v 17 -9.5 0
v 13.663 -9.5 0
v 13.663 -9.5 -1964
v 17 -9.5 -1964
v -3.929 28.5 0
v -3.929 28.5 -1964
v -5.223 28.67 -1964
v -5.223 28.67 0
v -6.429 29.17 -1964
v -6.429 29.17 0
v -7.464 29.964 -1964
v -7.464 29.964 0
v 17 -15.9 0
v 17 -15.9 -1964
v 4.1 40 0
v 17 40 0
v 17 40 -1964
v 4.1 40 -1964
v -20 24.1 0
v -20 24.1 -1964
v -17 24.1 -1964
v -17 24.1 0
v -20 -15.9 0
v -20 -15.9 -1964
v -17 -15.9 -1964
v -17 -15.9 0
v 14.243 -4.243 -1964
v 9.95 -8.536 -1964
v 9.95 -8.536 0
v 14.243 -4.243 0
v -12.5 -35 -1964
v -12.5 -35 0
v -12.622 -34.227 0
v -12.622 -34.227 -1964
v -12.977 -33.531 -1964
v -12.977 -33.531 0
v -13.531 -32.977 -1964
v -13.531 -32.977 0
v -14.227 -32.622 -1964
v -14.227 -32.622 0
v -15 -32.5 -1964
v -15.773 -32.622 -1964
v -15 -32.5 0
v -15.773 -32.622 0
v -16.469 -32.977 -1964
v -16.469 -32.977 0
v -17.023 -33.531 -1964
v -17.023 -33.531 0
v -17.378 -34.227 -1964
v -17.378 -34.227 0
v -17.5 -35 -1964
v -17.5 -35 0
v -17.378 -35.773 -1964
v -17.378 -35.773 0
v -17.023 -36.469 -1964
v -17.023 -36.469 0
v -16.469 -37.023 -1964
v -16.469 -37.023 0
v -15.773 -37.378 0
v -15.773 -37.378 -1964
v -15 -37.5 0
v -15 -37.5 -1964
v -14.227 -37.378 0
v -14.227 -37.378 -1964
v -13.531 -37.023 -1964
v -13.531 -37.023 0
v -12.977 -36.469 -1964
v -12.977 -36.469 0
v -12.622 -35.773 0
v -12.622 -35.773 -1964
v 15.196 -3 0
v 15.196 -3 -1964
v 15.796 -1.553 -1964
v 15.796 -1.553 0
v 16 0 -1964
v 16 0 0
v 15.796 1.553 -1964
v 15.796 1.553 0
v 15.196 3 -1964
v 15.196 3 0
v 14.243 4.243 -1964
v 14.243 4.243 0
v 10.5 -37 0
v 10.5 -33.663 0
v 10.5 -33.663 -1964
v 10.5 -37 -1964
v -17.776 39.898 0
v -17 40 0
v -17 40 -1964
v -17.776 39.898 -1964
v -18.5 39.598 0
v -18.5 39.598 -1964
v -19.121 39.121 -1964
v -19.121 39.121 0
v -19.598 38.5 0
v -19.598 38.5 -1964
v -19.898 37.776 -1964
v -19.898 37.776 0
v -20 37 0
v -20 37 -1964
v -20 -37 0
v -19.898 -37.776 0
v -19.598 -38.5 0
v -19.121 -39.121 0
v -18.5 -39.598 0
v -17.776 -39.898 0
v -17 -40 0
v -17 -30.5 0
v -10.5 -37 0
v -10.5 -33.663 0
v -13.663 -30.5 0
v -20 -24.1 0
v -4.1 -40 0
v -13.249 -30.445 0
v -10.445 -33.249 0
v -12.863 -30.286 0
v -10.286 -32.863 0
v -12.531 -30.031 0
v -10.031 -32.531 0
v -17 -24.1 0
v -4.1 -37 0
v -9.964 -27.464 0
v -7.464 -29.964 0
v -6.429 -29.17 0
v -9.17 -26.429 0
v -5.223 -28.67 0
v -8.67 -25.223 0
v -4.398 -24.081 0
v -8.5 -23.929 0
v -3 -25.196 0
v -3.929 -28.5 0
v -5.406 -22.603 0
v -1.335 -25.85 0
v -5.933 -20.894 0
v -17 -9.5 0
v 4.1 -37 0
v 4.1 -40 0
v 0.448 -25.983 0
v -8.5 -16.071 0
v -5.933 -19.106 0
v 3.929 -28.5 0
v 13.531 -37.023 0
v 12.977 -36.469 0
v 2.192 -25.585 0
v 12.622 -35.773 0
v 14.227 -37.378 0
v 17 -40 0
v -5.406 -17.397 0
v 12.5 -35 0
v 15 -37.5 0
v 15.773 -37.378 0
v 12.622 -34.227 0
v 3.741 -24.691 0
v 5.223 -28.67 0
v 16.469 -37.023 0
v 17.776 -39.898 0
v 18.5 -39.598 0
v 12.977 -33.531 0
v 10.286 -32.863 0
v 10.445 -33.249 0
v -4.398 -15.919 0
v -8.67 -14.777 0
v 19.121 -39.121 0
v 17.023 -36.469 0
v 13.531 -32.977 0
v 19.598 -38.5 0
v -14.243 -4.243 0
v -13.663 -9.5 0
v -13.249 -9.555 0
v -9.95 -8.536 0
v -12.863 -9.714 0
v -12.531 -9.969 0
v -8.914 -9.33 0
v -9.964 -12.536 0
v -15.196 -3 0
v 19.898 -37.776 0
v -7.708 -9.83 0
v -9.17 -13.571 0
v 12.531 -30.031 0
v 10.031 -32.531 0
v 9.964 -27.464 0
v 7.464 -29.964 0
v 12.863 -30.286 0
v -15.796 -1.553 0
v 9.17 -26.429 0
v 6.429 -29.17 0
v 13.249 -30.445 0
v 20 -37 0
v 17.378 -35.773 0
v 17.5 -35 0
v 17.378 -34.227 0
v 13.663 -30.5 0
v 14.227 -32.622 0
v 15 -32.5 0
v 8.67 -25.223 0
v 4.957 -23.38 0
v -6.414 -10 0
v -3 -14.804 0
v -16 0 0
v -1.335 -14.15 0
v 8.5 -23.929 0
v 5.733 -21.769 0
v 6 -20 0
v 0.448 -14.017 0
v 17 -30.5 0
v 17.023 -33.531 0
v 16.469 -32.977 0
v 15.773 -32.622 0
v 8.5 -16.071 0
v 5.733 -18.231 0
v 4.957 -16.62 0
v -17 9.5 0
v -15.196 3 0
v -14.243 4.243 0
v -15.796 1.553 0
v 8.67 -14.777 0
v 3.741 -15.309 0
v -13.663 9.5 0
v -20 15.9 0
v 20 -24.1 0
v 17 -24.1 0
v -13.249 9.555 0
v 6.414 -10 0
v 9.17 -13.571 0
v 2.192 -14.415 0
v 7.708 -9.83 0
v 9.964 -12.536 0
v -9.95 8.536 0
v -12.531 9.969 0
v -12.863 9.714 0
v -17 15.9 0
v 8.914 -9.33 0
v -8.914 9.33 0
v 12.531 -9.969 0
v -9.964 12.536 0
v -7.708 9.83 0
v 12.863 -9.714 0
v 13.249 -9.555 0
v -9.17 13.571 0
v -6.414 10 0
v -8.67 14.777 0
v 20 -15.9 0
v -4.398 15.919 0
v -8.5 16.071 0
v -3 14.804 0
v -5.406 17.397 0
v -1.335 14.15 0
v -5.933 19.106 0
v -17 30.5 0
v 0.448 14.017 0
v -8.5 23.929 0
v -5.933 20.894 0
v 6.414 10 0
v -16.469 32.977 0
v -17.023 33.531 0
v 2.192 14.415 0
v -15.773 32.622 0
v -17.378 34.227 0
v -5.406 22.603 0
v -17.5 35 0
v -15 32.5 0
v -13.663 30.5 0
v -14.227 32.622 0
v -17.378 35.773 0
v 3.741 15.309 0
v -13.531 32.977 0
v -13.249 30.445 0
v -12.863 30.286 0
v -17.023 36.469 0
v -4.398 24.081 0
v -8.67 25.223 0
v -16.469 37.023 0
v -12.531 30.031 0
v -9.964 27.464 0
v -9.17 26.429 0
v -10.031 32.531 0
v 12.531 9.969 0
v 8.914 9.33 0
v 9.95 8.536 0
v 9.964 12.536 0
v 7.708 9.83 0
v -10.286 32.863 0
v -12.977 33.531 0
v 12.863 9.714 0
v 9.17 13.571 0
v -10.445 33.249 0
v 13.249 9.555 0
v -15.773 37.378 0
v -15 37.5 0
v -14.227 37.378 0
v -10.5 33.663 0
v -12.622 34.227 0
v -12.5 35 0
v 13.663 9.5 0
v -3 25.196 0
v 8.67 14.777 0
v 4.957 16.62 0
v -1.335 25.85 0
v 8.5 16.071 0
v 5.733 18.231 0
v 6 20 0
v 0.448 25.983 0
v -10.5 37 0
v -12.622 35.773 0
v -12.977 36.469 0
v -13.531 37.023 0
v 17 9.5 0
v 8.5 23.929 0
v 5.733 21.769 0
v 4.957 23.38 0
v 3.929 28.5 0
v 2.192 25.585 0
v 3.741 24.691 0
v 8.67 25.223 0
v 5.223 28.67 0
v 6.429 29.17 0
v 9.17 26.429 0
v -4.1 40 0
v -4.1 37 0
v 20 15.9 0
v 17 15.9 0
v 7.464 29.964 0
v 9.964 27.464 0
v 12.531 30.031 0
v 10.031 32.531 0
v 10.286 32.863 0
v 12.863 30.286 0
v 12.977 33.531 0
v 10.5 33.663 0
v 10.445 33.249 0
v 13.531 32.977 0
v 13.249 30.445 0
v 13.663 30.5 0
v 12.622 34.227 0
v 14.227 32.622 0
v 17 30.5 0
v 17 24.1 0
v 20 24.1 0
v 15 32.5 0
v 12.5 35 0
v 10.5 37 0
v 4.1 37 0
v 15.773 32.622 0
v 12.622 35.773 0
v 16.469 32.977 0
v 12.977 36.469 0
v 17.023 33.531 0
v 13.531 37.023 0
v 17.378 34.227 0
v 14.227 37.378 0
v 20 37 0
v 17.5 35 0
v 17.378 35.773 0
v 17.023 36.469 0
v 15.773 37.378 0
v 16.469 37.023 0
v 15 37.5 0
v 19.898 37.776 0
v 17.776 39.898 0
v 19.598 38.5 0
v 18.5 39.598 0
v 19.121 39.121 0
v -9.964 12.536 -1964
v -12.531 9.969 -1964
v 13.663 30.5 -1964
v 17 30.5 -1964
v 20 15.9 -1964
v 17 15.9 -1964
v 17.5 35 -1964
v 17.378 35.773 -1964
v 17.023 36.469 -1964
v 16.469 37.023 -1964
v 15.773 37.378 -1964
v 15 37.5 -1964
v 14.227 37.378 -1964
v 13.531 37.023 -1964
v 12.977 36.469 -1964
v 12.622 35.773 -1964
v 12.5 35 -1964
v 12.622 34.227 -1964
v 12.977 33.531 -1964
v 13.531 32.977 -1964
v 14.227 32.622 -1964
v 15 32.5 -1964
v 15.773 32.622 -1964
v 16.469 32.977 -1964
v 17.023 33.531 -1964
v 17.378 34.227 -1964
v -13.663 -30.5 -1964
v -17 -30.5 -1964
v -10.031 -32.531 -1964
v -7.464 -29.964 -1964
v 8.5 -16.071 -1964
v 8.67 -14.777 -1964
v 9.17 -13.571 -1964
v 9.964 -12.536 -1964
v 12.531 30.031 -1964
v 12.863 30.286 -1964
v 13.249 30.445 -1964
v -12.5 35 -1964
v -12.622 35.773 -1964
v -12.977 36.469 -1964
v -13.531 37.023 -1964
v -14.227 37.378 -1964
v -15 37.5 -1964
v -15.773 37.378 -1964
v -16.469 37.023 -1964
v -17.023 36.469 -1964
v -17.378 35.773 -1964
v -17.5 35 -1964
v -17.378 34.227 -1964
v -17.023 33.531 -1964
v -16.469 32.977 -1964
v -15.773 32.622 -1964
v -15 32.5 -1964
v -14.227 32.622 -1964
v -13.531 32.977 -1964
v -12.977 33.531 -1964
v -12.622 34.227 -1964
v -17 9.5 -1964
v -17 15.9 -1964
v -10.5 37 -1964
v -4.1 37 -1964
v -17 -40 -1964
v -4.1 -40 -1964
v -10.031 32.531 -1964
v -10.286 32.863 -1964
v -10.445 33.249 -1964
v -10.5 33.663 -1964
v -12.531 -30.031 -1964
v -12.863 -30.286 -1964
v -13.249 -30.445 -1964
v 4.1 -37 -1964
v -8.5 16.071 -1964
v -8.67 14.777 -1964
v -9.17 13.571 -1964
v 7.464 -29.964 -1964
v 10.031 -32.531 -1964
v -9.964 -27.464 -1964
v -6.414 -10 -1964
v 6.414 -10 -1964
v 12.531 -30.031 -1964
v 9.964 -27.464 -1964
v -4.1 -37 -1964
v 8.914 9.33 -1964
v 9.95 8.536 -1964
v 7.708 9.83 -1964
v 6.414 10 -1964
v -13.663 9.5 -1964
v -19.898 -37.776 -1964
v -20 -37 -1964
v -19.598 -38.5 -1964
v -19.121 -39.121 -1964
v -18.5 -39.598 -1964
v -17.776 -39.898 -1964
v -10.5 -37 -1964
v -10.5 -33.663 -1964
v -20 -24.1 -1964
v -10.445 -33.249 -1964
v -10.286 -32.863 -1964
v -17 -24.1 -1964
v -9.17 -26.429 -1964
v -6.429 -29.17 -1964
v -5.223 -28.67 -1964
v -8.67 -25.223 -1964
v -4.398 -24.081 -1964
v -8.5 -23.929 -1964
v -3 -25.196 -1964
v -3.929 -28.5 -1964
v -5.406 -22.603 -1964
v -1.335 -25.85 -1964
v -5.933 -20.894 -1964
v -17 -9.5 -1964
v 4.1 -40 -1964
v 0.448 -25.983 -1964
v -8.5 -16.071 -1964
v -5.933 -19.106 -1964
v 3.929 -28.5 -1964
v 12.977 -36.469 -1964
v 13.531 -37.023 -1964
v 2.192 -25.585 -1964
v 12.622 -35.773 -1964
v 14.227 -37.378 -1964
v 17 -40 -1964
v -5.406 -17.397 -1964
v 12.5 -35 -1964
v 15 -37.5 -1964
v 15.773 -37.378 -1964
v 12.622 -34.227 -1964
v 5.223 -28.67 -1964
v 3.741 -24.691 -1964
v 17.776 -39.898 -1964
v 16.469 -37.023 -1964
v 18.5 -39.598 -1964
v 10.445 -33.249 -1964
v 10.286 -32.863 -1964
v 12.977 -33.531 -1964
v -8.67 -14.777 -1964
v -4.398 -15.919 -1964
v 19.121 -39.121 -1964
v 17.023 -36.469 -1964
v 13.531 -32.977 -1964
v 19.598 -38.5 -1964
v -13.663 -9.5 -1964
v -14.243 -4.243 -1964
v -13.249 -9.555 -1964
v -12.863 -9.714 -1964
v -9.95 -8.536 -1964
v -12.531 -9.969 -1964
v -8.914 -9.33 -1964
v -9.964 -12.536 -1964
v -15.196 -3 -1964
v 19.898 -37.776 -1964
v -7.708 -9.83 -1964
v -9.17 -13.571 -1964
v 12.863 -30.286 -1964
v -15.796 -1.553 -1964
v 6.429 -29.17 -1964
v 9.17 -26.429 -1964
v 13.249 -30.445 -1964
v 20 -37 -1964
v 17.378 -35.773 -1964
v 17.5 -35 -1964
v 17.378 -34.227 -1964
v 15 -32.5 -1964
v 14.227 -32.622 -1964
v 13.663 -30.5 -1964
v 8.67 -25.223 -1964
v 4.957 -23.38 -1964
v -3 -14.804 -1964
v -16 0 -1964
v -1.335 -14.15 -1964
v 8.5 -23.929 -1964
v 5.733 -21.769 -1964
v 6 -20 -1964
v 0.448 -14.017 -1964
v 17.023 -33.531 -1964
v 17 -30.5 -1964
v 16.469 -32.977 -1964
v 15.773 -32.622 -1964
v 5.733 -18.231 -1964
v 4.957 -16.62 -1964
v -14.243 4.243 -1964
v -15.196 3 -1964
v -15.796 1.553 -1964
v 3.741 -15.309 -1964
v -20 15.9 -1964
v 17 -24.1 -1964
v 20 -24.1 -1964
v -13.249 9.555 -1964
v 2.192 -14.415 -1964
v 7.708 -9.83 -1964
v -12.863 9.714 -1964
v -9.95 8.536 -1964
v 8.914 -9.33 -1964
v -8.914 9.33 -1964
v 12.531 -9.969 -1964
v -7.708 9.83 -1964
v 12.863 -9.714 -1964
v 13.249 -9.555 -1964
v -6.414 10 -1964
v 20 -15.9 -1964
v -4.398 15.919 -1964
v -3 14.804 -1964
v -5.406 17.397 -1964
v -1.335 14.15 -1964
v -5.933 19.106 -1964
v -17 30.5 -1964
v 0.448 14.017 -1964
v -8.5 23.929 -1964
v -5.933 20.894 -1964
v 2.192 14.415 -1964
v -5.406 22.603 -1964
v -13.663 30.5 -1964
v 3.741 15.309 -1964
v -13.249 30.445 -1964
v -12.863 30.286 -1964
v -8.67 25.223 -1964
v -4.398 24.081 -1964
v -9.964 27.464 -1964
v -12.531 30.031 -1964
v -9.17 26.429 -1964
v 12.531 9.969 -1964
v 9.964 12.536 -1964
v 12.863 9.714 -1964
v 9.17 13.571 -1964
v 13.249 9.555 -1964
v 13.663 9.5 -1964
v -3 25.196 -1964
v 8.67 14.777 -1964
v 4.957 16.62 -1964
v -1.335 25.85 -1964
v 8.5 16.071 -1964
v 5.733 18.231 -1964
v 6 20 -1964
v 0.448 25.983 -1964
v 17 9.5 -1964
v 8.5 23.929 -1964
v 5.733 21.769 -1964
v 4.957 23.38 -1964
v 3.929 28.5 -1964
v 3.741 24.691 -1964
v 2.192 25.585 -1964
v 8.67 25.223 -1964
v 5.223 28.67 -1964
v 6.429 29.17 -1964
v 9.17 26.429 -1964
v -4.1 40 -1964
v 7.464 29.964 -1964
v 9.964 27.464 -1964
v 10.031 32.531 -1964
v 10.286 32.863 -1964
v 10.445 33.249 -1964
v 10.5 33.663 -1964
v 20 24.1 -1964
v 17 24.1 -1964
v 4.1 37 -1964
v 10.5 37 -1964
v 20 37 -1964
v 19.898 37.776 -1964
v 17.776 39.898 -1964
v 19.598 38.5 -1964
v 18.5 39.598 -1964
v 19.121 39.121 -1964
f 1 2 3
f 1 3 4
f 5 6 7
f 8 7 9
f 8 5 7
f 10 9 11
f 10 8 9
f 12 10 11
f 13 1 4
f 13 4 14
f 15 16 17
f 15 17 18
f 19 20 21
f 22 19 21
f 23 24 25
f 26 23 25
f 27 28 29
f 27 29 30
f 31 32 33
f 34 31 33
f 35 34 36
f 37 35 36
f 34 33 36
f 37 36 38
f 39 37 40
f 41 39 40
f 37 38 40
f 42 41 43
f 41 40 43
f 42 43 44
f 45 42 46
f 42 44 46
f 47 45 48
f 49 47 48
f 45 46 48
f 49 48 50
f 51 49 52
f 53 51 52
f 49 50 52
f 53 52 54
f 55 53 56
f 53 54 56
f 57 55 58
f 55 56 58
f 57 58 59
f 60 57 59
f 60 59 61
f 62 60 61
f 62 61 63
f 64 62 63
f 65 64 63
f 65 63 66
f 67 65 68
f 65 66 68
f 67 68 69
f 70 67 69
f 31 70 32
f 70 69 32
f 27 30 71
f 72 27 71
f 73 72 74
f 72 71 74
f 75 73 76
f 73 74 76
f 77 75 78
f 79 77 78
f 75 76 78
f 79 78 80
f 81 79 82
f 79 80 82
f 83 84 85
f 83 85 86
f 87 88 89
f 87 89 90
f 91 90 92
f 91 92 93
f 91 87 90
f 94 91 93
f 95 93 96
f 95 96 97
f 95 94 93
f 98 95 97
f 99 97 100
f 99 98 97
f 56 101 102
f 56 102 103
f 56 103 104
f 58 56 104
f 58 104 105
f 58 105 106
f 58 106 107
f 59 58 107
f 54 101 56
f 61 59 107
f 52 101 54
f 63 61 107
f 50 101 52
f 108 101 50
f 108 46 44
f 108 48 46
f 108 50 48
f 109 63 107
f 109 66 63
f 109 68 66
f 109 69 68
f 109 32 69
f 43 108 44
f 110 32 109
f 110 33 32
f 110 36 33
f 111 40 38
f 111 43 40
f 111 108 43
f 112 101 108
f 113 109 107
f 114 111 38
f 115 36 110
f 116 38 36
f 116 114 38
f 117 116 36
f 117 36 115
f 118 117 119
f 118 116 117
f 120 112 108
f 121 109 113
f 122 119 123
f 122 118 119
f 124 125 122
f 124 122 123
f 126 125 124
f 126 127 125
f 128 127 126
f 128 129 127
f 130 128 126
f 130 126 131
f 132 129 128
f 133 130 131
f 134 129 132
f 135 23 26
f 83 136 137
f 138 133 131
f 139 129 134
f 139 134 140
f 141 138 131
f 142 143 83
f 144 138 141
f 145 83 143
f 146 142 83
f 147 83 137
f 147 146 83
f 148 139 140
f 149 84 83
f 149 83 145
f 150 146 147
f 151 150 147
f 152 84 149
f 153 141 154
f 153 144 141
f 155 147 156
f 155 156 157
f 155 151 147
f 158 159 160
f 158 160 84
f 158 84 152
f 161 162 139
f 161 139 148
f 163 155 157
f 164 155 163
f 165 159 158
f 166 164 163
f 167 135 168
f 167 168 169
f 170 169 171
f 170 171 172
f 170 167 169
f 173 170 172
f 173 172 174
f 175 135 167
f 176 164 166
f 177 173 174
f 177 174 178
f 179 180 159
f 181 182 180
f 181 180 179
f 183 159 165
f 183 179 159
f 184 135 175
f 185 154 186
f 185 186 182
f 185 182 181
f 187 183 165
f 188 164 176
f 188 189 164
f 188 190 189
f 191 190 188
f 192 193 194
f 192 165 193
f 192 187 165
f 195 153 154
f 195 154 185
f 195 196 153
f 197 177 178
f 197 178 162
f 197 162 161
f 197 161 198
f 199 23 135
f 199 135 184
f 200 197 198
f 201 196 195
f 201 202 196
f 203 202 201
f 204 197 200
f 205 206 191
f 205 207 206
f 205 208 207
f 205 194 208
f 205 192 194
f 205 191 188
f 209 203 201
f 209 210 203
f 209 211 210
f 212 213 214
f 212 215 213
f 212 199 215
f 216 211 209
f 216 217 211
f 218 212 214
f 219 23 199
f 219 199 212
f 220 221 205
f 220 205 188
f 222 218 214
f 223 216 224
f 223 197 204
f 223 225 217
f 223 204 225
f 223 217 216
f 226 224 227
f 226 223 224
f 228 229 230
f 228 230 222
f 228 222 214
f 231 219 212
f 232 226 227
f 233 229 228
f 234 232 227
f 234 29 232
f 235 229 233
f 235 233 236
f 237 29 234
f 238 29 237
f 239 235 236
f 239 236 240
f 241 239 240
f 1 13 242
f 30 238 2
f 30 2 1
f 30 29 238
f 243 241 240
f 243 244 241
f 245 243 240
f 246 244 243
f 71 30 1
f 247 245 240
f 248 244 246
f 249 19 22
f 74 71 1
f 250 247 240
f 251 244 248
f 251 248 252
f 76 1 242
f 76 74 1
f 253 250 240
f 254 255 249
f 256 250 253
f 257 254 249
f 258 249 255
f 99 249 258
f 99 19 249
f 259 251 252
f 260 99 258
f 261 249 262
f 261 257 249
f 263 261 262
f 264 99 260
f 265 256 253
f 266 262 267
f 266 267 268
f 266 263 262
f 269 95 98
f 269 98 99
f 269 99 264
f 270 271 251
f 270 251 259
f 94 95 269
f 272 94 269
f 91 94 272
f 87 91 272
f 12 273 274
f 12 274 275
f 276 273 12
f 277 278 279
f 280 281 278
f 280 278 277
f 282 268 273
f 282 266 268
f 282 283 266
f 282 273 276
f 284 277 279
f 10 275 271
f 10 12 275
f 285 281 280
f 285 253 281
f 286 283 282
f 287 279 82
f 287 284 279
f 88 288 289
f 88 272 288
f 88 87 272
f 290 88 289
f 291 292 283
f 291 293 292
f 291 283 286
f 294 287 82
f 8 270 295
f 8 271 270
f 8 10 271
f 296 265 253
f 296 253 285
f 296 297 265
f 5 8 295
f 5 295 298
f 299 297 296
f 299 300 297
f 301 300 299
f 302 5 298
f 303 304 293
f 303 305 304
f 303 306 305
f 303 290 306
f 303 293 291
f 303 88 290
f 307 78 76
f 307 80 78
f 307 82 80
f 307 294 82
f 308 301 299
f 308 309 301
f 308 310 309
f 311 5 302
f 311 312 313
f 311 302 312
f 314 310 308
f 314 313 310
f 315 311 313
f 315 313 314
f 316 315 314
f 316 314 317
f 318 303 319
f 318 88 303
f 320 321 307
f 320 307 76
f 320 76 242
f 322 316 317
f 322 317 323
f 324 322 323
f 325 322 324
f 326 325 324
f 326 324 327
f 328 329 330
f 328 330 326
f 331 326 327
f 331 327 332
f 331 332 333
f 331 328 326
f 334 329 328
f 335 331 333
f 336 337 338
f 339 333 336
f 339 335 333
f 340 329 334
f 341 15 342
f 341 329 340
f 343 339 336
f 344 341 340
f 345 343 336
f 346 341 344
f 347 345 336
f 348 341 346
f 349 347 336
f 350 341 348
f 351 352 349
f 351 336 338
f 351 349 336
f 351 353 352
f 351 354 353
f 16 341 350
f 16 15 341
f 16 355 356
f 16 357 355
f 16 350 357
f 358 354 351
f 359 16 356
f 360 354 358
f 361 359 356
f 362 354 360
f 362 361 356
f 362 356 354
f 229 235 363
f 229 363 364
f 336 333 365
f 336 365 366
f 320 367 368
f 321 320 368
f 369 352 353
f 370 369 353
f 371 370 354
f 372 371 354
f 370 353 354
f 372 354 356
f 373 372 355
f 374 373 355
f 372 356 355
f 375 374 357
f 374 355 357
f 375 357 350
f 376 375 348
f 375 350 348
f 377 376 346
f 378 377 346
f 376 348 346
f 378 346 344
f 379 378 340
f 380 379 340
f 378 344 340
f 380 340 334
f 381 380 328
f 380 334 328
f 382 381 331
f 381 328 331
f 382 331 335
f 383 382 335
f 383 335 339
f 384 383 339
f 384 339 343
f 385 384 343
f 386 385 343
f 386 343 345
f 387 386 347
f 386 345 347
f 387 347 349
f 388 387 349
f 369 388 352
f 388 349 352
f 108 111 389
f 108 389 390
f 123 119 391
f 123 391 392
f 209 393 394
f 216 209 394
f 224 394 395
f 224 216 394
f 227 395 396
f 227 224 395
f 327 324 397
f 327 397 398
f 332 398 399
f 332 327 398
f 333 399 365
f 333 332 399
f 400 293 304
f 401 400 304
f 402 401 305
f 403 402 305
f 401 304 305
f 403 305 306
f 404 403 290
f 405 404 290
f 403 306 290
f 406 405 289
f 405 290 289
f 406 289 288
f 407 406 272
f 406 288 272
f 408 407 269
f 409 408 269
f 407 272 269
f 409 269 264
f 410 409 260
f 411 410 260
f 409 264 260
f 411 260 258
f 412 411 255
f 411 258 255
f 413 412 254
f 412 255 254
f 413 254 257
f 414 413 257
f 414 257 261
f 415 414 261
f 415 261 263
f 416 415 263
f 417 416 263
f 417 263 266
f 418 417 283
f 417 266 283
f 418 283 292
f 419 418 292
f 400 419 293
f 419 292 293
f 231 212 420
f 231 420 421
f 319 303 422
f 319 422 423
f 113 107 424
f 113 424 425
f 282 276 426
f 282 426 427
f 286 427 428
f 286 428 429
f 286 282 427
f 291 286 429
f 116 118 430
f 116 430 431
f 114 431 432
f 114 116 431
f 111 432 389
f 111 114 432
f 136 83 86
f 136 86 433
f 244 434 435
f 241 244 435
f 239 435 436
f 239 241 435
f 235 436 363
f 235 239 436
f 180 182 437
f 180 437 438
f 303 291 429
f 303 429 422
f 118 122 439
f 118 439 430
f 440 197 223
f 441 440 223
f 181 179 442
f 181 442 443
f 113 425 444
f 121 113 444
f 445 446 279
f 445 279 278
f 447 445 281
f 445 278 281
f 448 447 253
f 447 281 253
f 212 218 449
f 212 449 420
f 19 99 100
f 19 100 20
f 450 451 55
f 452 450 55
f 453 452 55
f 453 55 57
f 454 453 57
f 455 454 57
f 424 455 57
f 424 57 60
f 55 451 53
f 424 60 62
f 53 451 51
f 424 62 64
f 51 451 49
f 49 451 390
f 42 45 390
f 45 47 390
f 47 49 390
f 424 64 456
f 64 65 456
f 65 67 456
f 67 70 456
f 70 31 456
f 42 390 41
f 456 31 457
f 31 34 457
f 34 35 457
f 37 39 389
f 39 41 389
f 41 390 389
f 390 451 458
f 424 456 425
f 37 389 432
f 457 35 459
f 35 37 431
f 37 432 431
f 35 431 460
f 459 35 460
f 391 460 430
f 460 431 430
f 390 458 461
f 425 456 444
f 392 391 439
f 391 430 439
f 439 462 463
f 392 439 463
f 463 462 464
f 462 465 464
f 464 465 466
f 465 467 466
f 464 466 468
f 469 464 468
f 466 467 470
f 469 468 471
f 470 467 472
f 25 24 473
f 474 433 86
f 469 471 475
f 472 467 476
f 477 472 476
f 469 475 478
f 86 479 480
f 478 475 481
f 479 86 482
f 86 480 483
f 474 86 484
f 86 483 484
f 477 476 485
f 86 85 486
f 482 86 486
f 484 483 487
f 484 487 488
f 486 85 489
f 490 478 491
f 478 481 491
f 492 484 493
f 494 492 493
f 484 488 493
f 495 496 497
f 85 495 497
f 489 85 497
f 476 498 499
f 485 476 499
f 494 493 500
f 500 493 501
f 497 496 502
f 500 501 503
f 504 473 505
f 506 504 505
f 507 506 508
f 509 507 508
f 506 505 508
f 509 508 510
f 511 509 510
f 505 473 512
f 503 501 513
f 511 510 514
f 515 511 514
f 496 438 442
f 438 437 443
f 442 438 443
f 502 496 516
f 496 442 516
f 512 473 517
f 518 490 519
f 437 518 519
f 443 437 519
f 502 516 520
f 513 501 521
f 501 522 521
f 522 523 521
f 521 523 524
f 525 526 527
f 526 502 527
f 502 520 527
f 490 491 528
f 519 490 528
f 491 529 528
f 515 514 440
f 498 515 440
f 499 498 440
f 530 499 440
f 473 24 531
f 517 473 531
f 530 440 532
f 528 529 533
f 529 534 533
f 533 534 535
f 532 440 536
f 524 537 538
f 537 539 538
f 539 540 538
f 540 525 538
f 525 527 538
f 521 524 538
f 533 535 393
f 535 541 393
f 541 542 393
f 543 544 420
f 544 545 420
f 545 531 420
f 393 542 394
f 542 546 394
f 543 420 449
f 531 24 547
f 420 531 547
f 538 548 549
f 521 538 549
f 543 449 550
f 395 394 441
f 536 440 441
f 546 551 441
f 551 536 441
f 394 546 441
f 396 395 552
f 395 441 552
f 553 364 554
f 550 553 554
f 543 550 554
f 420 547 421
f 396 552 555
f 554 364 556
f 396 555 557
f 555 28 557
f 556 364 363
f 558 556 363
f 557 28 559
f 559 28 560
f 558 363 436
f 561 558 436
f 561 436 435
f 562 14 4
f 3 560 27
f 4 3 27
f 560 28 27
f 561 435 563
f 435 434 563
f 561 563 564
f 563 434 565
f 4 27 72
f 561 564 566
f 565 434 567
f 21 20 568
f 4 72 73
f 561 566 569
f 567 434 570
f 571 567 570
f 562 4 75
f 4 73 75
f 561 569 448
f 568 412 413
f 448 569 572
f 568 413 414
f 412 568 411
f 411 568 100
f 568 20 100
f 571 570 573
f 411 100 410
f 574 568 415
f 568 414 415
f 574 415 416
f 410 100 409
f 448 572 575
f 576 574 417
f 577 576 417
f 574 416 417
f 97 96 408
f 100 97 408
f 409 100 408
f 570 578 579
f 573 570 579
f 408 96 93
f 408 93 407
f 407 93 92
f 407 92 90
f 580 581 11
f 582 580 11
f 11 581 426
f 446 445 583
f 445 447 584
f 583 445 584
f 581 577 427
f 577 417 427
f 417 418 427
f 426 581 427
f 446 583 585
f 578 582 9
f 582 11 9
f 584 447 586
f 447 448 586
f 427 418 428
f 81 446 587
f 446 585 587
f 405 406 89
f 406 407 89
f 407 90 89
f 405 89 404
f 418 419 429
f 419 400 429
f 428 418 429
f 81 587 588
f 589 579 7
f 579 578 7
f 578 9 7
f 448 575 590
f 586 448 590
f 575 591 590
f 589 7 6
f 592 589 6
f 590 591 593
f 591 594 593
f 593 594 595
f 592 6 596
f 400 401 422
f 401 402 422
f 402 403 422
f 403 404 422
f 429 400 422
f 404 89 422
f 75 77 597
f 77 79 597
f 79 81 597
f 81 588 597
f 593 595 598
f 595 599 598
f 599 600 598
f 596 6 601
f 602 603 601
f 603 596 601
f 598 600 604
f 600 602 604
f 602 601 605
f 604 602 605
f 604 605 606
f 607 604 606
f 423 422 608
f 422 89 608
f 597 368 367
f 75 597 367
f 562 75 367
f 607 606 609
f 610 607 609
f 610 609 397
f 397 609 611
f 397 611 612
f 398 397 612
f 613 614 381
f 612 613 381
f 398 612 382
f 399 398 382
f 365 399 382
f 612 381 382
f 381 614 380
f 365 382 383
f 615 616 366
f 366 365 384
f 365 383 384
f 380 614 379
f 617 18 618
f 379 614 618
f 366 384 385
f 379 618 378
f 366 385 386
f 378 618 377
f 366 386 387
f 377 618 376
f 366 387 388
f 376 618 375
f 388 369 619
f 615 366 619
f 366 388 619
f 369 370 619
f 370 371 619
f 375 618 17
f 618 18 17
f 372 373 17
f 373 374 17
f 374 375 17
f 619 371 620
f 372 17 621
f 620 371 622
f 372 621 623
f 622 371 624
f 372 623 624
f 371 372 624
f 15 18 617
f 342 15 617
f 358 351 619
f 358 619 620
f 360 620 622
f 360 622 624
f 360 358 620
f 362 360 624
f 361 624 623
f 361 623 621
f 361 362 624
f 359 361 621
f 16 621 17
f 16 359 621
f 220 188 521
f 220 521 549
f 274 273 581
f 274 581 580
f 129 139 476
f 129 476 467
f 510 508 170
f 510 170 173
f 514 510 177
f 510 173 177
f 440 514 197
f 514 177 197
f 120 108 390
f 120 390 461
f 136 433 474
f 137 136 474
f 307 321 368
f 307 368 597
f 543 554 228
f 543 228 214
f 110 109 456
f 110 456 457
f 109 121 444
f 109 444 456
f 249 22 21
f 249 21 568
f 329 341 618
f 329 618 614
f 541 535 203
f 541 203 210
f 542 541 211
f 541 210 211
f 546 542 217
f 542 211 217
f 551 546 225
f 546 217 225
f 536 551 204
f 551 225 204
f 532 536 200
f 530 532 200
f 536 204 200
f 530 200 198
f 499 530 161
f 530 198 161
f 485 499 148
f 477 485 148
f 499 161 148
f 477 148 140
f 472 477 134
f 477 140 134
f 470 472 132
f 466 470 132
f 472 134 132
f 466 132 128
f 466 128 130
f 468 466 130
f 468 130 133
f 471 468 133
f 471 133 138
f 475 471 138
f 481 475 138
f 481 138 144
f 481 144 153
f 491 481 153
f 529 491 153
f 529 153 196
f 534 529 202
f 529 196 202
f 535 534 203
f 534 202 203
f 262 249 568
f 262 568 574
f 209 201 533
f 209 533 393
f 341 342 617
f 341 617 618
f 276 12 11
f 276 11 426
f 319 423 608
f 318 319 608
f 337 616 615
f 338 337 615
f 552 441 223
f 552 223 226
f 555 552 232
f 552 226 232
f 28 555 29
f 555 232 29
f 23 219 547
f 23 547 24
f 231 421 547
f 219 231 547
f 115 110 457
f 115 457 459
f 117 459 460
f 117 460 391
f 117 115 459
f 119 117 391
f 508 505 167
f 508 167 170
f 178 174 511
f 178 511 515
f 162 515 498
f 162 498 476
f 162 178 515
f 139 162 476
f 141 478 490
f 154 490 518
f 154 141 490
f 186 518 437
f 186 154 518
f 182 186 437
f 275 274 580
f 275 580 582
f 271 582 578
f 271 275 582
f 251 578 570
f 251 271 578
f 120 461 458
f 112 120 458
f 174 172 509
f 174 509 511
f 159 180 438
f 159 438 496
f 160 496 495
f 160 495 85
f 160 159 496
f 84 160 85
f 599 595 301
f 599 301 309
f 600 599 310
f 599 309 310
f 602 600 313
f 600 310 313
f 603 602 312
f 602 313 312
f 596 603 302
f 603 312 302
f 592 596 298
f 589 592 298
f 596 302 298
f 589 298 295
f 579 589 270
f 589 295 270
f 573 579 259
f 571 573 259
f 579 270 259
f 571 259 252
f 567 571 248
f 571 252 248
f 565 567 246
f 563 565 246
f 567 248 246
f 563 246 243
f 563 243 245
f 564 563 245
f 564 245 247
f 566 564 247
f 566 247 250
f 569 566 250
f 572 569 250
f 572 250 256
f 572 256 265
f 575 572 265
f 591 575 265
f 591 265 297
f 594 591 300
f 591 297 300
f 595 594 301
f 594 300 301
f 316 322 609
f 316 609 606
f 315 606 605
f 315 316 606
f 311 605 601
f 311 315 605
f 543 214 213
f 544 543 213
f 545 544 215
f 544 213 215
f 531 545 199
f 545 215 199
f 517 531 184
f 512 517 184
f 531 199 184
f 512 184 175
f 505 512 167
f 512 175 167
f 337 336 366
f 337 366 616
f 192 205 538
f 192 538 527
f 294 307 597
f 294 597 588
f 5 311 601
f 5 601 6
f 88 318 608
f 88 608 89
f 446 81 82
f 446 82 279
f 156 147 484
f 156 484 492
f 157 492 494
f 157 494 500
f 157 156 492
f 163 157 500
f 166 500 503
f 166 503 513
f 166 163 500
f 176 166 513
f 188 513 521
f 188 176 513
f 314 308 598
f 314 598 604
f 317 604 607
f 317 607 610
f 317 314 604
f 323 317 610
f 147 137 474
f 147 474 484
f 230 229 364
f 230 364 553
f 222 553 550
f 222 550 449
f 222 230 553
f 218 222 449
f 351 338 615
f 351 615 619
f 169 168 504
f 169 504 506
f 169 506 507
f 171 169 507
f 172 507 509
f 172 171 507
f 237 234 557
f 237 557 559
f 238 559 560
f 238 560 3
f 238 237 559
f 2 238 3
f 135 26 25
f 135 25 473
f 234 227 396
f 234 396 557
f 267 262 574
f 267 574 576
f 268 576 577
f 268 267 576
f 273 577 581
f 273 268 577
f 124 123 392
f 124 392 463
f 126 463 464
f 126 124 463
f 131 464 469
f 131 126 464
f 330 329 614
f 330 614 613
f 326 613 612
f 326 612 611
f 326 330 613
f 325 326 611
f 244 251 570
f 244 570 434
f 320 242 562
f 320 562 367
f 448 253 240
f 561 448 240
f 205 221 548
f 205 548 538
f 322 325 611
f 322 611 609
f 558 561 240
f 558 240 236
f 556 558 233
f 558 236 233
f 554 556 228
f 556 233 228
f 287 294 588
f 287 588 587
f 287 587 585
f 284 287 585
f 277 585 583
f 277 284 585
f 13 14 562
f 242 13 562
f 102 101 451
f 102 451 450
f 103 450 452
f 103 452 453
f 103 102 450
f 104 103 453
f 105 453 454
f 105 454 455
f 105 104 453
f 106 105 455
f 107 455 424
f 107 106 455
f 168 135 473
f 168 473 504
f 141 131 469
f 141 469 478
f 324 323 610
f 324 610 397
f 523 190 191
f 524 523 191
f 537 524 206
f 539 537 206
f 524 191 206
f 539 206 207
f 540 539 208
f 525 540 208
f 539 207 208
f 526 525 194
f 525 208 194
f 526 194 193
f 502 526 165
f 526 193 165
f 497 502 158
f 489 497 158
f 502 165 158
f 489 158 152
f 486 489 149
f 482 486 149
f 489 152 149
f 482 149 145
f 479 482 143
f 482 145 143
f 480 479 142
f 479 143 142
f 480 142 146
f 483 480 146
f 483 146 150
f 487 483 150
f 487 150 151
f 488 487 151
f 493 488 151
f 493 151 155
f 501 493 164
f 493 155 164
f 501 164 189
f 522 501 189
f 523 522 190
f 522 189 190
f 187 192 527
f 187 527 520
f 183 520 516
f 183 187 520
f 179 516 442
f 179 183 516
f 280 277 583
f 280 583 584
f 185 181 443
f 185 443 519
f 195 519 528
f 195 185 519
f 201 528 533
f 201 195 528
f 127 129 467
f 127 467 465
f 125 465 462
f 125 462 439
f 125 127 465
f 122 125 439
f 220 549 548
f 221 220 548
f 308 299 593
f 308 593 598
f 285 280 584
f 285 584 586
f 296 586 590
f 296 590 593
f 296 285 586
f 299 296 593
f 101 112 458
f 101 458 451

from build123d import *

# Parameters (mm, degrees)
SKETCH1_R           = 2.5
SKETCH1_R_2         = 6
BOSS_EXTRUDE1_DEPTH = 1964


with BuildPart() as part:
    # Sketch1 → Boss-Extrude1 (new body)
    with BuildSketch(Plane.XY):
        with BuildLine():
            Line((-17, -40), (-4.1, -40))
            Line((-4.1, -40), (-4.1, -37))
            Line((-4.1, -37), (-10.5, -37))
            Line((-10.5, -37), (-10.5, -33.6627417))
            ThreePointArc((-10.5, -33.6627417), (-10.378207252, -33.050448208), (-10.03137085, -32.53137085))
            Line((-10.03137085, -32.53137085), (-7.464466094, -29.964466094))
            ThreePointArc((-7.464466094, -29.964466094), (-5.84234935, -28.880602337), (-3.928932188, -28.5))
            Line((-3.928932188, -28.5), (3.928932188, -28.5))
            ThreePointArc((3.928932188, -28.5), (5.84234935, -28.880602337), (7.464466094, -29.964466094))
            Line((7.464466094, -29.964466094), (10.03137085, -32.53137085))
            ThreePointArc((10.03137085, -32.53137085), (10.378207252, -33.050448208), (10.5, -33.6627417))
            Line((10.5, -33.6627417), (10.5, -37))
            Line((10.5, -37), (4.1, -37))
            Line((4.1, -37), (4.1, -40))
            Line((4.1, -40), (17, -40))
            ThreePointArc((17, -40), (19.121320344, -39.121320344), (20, -37))
            Line((20, -37), (20, -24.1))
            Line((20, -24.1), (17, -24.1))
            Line((17, -24.1), (17, -30.5))
            Line((17, -30.5), (13.6627417, -30.5))
            ThreePointArc((13.6627417, -30.5), (13.050448208, -30.378207252), (12.53137085, -30.03137085))
            Line((12.53137085, -30.03137085), (9.964466094, -27.464466094))
            ThreePointArc((9.964466094, -27.464466094), (8.880602337, -25.84234935), (8.5, -23.928932188))
            Line((8.5, -23.928932188), (8.5, -16.071067812))
            ThreePointArc((8.5, -16.071067812), (8.880602337, -14.15765065), (9.964466094, -12.535533906))
            Line((9.964466094, -12.535533906), (12.53137085, -9.96862915))
            ThreePointArc((12.53137085, -9.96862915), (13.050448208, -9.621792748), (13.6627417, -9.5))
            Line((13.6627417, -9.5), (17, -9.5))
            Line((17, -9.5), (17, -15.9))
            Line((17, -15.9), (20, -15.9))
            Line((20, -15.9), (20, 15.9))
            Line((20, 15.9), (17, 15.9))
            Line((17, 15.9), (17, 9.5))
            Line((17, 9.5), (13.6627417, 9.5))
            ThreePointArc((13.6627417, 9.5), (13.050448208, 9.621792748), (12.53137085, 9.96862915))
            Line((12.53137085, 9.96862915), (9.964466094, 12.535533906))
            ThreePointArc((9.964466094, 12.535533906), (8.880602337, 14.15765065), (8.5, 16.071067812))
            Line((8.5, 16.071067812), (8.5, 23.928932188))
            ThreePointArc((8.5, 23.928932188), (8.880602337, 25.84234935), (9.964466094, 27.464466094))
            Line((9.964466094, 27.464466094), (12.53137085, 30.03137085))
            ThreePointArc((12.53137085, 30.03137085), (13.050448208, 30.378207252), (13.6627417, 30.5))
            Line((13.6627417, 30.5), (17, 30.5))
            Line((17, 30.5), (17, 24.1))
            Line((17, 24.1), (20, 24.1))
            Line((20, 24.1), (20, 37))
            ThreePointArc((20, 37), (19.121320344, 39.121320344), (17, 40))
            Line((17, 40), (4.1, 40))
            Line((4.1, 40), (4.1, 37))
            Line((4.1, 37), (10.5, 37))
            Line((10.5, 37), (10.5, 33.6627417))
            ThreePointArc((10.5, 33.6627417), (10.378207252, 33.050448208), (10.03137085, 32.53137085))
            Line((10.03137085, 32.53137085), (7.464466094, 29.964466094))
            ThreePointArc((7.464466094, 29.964466094), (5.84234935, 28.880602337), (3.928932188, 28.5))
            Line((3.928932188, 28.5), (-3.928932188, 28.5))
            ThreePointArc((-3.928932188, 28.5), (-5.84234935, 28.880602337), (-7.464466094, 29.964466094))
            Line((-7.464466094, 29.964466094), (-10.03137085, 32.53137085))
            ThreePointArc((-10.03137085, 32.53137085), (-10.378207252, 33.050448208), (-10.5, 33.6627417))
            Line((-10.5, 33.6627417), (-10.5, 37))
            Line((-10.5, 37), (-4.1, 37))
            Line((-4.1, 37), (-4.1, 40))
            Line((-4.1, 40), (-17, 40))
            ThreePointArc((-17, 40), (-19.121320344, 39.121320344), (-20, 37))
            Line((-20, 37), (-20, 24.1))
            Line((-20, 24.1), (-17, 24.1))
            Line((-17, 24.1), (-17, 30.5))
            Line((-17, 30.5), (-13.6627417, 30.5))
            ThreePointArc((-13.6627417, 30.5), (-13.050448208, 30.378207252), (-12.53137085, 30.03137085))
            Line((-12.53137085, 30.03137085), (-9.964466094, 27.464466094))
            ThreePointArc((-9.964466094, 27.464466094), (-8.880602337, 25.84234935), (-8.5, 23.928932188))
            Line((-8.5, 23.928932188), (-8.5, 16.071067812))
            ThreePointArc((-8.5, 16.071067812), (-8.880602337, 14.15765065), (-9.964466094, 12.535533906))
            Line((-9.964466094, 12.535533906), (-12.53137085, 9.96862915))
            ThreePointArc((-12.53137085, 9.96862915), (-13.050448208, 9.621792748), (-13.6627417, 9.5))
            Line((-13.6627417, 9.5), (-17, 9.5))
            Line((-17, 9.5), (-17, 15.9))
            Line((-17, 15.9), (-20, 15.9))
            Line((-20, 15.9), (-20, -15.9))
            Line((-20, -15.9), (-17, -15.9))
            Line((-17, -15.9), (-17, -9.5))
            Line((-17, -9.5), (-13.6627417, -9.5))
            ThreePointArc((-13.6627417, -9.5), (-13.050448208, -9.621792748), (-12.53137085, -9.96862915))
            Line((-12.53137085, -9.96862915), (-9.964466094, -12.535533906))
            ThreePointArc((-9.964466094, -12.535533906), (-8.880602337, -14.15765065), (-8.5, -16.071067812))
            Line((-8.5, -16.071067812), (-8.5, -23.928932188))
            ThreePointArc((-8.5, -23.928932188), (-8.880602337, -25.84234935), (-9.964466094, -27.464466094))
            Line((-9.964466094, -27.464466094), (-12.53137085, -30.03137085))
            ThreePointArc((-12.53137085, -30.03137085), (-13.050448208, -30.378207252), (-13.6627417, -30.5))
            Line((-13.6627417, -30.5), (-17, -30.5))
            Line((-17, -30.5), (-17, -24.1))
            Line((-17, -24.1), (-20, -24.1))
            Line((-20, -24.1), (-20, -37))
            ThreePointArc((-20, -37), (-19.121320344, -39.121320344), (-17, -40))
        make_face()
        with Locations((15, 35)):
            Circle(SKETCH1_R, mode=Mode.SUBTRACT)
        with Locations((15, -35)):
            Circle(SKETCH1_R, mode=Mode.SUBTRACT)
        with Locations((0, 20)):
            Circle(SKETCH1_R_2, mode=Mode.SUBTRACT)
        with Locations((0, -20)):
            Circle(SKETCH1_R_2, mode=Mode.SUBTRACT)
        with Locations((-15, 35)):
            Circle(SKETCH1_R, mode=Mode.SUBTRACT)
        with Locations((-15, -35)):
            Circle(SKETCH1_R, mode=Mode.SUBTRACT)
        with BuildLine():
            Line((-14.242640687, -4.242640687), (-9.949747468, -8.535533906))
            ThreePointArc((-9.949747468, -8.535533906), (-8.327630724, -9.619397663), (-6.414213562, -10))
            Line((-6.414213562, -10), (6.414213562, -10))
            ThreePointArc((6.414213562, -10), (8.327630724, -9.619397663), (9.949747468, -8.535533906))
            Line((9.949747468, -8.535533906), (14.242640687, -4.242640687))
            ThreePointArc((14.242640687, -4.242640687), (16, 0), (14.242640687, 4.242640687))
            Line((14.242640687, 4.242640687), (9.949747468, 8.535533906))
            ThreePointArc((9.949747468, 8.535533906), (8.327630724, 9.619397663), (6.414213562, 10))
            Line((6.414213562, 10), (-6.414213562, 10))
            ThreePointArc((-6.414213562, 10), (-8.327630724, 9.619397663), (-9.949747468, 8.535533906))
            Line((-9.949747468, 8.535533906), (-14.242640687, 4.242640687))
            ThreePointArc((-14.242640687, 4.242640687), (-16, 0), (-14.242640687, -4.242640687))
        make_face(mode=Mode.SUBTRACT)
    extrude(amount=-BOSS_EXTRUDE1_DEPTH)


solid = part.part
